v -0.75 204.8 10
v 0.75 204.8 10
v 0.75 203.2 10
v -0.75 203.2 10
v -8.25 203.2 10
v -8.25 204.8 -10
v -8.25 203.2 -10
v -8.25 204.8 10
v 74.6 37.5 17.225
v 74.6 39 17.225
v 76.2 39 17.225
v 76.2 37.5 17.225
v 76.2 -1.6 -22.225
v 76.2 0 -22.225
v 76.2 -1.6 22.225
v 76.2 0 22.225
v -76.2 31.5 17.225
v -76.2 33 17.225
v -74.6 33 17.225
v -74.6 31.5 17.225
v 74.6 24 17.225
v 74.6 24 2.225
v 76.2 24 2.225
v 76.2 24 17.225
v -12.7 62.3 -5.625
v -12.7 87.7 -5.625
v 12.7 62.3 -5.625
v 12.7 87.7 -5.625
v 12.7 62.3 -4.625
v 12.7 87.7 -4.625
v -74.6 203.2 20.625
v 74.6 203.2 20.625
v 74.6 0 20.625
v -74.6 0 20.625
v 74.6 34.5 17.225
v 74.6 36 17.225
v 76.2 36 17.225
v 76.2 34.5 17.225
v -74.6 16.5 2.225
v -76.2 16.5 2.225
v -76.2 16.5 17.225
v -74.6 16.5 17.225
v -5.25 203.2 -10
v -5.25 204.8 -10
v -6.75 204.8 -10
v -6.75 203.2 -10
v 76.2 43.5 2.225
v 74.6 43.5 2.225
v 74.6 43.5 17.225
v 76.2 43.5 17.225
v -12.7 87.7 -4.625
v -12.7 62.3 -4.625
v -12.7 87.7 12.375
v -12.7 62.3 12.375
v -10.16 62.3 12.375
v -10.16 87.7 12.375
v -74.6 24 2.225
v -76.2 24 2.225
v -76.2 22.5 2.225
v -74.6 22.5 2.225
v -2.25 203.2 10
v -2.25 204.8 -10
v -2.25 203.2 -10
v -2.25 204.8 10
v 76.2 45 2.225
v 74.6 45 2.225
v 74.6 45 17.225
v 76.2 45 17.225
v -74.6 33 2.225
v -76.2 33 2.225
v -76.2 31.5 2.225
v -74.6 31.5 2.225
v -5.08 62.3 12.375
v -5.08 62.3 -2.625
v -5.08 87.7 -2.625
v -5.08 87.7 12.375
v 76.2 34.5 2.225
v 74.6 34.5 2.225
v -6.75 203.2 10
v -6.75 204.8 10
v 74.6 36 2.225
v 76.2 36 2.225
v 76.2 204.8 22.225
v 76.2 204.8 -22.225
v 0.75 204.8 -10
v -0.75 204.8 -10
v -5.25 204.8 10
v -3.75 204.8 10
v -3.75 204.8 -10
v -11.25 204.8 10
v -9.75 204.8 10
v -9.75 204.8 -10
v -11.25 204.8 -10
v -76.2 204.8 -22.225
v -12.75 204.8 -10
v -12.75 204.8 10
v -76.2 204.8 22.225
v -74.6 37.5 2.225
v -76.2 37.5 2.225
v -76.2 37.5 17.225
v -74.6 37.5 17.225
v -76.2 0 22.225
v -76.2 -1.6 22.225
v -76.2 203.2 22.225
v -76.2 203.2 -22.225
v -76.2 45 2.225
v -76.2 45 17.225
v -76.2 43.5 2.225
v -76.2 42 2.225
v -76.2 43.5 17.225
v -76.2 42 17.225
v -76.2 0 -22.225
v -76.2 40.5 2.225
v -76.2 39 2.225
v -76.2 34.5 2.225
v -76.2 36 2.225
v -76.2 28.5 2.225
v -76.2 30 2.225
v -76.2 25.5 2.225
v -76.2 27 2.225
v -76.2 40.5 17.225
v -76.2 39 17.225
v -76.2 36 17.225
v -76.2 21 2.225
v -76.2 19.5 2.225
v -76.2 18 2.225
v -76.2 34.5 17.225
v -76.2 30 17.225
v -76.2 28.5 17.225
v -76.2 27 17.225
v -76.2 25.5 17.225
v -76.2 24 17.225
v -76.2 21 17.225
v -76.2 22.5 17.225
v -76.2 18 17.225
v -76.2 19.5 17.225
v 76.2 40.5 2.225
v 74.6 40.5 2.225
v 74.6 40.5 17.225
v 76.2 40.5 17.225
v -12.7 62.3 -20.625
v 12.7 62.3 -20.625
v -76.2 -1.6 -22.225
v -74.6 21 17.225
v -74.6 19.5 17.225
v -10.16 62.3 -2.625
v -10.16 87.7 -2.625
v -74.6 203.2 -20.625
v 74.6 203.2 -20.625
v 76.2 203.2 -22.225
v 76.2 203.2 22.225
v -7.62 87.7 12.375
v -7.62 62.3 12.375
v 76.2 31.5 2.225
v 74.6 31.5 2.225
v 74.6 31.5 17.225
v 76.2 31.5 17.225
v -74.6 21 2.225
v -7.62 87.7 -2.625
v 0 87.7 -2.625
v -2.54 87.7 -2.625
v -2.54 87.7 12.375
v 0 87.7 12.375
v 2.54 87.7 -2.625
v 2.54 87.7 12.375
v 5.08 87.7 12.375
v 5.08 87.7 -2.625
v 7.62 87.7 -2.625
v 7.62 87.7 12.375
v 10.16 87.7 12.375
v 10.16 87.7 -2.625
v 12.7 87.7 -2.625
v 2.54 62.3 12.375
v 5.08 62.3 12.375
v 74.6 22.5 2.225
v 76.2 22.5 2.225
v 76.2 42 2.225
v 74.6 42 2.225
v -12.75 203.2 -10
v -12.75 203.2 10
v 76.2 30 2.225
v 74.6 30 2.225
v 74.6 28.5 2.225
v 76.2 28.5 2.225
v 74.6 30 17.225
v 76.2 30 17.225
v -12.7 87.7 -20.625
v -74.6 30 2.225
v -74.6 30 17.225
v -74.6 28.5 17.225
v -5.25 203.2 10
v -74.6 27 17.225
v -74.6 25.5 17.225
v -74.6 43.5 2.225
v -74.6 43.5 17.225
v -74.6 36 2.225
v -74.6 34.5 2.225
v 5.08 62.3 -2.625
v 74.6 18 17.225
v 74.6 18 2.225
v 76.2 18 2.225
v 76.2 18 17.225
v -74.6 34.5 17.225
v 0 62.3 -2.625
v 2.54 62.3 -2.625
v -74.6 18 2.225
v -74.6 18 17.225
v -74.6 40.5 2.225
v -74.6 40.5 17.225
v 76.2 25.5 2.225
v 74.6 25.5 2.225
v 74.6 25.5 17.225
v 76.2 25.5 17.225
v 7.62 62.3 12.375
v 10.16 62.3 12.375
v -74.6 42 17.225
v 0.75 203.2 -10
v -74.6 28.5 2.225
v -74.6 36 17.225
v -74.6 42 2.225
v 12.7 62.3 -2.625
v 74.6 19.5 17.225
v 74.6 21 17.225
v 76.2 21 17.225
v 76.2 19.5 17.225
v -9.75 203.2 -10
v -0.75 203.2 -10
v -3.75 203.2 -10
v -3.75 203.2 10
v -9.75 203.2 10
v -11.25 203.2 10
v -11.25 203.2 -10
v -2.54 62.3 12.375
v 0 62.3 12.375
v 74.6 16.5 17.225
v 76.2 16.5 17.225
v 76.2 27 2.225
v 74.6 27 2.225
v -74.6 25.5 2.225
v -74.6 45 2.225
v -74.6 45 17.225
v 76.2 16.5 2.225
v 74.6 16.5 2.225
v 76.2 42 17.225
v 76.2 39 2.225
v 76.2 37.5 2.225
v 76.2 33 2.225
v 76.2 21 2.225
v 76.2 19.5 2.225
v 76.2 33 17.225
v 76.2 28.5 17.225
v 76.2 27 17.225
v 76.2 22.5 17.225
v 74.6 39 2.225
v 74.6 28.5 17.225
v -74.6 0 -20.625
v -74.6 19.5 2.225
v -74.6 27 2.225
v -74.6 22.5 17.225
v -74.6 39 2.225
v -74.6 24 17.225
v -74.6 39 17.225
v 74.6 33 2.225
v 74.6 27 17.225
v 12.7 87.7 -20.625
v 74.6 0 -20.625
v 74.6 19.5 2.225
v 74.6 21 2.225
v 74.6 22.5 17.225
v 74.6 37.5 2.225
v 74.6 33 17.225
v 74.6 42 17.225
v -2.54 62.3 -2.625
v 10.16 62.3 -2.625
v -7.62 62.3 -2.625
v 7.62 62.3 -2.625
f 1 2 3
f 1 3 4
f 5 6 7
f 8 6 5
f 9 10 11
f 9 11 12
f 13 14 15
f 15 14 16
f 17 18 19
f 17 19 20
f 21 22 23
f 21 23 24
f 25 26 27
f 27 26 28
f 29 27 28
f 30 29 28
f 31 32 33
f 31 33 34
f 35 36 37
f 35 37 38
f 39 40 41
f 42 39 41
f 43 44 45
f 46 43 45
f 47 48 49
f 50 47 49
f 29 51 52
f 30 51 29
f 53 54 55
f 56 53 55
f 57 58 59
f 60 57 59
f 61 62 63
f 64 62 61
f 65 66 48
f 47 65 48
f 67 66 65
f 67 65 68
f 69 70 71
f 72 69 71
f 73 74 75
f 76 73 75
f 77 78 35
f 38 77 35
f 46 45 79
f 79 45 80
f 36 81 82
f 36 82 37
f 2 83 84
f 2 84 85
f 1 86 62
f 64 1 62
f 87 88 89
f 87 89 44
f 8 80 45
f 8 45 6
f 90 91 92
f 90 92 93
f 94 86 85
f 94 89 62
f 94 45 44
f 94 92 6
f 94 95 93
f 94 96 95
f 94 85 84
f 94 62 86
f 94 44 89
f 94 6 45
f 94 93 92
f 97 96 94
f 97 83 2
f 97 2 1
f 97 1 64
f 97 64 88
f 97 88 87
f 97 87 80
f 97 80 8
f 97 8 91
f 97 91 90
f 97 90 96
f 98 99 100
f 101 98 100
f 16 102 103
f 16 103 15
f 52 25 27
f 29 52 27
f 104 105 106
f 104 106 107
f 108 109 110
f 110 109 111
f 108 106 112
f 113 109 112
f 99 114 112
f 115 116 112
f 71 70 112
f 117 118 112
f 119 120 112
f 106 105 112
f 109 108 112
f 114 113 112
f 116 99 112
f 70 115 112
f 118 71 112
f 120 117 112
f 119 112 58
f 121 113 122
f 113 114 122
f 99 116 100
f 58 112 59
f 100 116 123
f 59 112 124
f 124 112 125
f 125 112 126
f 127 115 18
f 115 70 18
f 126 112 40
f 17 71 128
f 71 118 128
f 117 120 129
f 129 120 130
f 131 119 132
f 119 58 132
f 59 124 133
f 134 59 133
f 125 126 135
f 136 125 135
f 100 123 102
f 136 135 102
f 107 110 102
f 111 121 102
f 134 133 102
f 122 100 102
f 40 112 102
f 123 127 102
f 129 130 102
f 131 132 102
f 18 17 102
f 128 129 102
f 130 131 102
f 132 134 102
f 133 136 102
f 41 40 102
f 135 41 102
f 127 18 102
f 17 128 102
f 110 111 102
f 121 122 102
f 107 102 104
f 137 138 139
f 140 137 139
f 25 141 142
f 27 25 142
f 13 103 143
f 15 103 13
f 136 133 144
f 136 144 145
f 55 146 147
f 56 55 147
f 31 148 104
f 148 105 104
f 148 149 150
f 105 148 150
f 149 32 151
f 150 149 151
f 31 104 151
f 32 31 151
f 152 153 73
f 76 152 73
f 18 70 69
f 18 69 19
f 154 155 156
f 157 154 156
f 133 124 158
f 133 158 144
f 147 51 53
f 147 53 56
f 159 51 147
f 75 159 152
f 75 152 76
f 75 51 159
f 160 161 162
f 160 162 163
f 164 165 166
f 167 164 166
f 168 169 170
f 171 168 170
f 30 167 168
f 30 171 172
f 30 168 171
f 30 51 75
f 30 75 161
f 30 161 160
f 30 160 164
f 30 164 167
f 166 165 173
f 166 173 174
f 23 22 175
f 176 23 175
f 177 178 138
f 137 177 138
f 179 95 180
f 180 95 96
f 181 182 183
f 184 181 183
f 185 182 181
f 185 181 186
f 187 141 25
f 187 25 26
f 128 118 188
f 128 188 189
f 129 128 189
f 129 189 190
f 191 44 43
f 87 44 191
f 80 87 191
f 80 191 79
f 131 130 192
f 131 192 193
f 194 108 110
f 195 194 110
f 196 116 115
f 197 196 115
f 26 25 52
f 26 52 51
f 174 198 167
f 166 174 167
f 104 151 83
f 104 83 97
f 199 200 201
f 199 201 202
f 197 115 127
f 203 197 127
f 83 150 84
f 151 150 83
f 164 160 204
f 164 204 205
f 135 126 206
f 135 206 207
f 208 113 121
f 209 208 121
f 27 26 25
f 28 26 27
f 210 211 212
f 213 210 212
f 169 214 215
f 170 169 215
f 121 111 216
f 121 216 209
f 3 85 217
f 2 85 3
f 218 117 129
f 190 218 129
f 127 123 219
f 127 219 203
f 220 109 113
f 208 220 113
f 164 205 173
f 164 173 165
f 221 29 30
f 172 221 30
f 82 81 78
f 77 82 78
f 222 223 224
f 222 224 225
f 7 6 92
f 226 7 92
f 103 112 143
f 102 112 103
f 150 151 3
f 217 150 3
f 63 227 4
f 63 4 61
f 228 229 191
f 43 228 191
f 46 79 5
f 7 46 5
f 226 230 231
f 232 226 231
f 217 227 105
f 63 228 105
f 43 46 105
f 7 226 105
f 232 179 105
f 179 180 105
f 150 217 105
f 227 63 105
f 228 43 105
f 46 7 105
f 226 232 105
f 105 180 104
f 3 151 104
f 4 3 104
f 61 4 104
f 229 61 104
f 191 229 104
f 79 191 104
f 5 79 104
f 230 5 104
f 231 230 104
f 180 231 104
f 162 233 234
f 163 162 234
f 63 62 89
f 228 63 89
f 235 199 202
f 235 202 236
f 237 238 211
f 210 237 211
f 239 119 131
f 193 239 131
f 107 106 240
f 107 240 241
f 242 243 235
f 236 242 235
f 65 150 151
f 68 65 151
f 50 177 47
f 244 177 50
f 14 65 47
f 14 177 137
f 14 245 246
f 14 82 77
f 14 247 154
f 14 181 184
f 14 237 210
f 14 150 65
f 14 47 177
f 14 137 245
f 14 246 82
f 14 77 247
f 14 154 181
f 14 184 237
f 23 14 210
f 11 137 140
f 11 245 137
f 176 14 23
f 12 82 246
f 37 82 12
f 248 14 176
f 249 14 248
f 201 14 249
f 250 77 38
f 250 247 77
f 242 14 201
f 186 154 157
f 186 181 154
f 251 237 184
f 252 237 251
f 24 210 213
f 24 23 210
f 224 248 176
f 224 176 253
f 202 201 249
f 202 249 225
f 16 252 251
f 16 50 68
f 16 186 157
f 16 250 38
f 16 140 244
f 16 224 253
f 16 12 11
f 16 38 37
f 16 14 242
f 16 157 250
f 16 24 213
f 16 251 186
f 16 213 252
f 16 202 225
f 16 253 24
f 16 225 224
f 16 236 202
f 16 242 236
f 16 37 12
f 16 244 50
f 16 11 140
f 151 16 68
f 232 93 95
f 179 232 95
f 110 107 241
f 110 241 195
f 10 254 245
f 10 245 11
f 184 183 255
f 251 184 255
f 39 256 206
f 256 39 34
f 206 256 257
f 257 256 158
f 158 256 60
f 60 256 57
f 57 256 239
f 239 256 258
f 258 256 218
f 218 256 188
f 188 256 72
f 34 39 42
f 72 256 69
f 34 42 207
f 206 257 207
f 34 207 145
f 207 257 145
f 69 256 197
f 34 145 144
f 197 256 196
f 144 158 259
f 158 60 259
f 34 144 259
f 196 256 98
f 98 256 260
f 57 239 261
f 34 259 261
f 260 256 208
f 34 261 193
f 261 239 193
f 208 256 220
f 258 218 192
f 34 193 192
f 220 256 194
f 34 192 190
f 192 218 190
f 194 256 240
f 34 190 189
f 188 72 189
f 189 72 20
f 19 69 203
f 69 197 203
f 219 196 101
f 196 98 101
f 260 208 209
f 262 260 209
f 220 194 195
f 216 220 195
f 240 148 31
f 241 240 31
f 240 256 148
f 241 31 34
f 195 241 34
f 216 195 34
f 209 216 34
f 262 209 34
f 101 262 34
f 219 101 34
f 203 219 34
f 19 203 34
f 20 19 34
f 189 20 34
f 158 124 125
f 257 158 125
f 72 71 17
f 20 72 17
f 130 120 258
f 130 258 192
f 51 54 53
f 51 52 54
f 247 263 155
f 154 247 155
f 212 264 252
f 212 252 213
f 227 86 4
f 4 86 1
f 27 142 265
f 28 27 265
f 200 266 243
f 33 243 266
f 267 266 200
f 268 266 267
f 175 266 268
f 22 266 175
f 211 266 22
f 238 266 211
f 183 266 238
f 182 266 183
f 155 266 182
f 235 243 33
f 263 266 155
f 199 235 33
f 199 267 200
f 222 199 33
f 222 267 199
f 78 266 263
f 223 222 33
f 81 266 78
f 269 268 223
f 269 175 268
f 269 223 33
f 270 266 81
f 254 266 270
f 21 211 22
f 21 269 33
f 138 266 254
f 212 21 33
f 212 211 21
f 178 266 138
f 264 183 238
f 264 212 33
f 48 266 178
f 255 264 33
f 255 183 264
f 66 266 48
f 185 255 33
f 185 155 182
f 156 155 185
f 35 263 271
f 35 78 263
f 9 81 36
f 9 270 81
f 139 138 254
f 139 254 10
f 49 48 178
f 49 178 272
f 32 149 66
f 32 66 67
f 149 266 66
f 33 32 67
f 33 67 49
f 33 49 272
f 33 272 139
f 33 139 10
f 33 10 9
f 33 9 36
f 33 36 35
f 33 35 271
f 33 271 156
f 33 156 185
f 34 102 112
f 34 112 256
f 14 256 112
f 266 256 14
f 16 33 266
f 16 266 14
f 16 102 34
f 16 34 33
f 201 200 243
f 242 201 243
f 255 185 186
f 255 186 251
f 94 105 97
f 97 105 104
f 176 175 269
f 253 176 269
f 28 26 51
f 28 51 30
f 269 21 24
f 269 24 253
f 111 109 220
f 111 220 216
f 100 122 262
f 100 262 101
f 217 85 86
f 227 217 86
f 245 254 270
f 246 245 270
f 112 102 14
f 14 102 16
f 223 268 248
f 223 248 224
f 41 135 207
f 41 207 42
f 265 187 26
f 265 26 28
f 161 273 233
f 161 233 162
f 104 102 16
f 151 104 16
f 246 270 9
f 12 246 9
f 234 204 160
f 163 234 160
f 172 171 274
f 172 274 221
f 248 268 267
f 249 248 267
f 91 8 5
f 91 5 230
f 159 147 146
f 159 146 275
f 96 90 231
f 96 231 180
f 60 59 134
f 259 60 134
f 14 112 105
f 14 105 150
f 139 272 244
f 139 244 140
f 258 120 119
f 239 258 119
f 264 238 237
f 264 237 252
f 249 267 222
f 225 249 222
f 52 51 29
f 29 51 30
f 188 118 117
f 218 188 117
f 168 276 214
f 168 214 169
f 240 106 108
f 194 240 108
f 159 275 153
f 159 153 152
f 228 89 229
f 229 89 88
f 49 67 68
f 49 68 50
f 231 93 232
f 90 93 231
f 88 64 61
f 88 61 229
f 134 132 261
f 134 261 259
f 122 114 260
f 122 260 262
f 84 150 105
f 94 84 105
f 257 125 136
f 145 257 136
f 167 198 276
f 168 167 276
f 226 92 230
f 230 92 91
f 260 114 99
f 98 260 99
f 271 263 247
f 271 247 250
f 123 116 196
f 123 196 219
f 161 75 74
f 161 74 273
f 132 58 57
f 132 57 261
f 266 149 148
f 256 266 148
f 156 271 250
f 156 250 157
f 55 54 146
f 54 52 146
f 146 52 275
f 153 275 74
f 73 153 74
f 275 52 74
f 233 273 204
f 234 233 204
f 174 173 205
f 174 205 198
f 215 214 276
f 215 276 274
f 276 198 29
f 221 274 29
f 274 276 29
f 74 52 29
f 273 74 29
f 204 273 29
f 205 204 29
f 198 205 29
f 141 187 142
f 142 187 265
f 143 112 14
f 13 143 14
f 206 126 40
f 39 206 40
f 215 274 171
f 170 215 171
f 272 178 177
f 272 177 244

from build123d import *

# Parameters (mm, degrees)
F0_W      = 152.4
F0_H      = 44.45
F1_DEPTH  = 203.2
F2_W      = 149.1996
F2_H      = 41.2496
F3_DEPTH  = 203.201
F7_W      = 152.4
F7_H      = 44.45
F8_DEPTH  = 1.6002
F9_W      = 152.4
F9_H      = 44.45
F10_DEPTH = 1.6002
F11_W     = 1.5
F11_H     = 15
F12_DEPTH = 152.401
F13_W     = 25.4
F13_H     = 25.4
F14_DEPTH = 15
F15_W     = 25.4
F15_H     = 25.4
F16_DEPTH = 1
F17_W     = 25.4
F17_H     = 25.4
F18_DEPTH = 2
F19_W     = 2.54
F19_H     = 25.4
F20_DEPTH = 15
F21_W     = 1.5
F21_H     = 20
F22_DEPTH = 25


# Not quite as in the source:
# - a feature of the source that left no trace in its solid (it failed there, or was rolled back) is left out


with BuildPart() as f1:
    # F0 (on Front) → F1 (new body)
    with BuildSketch(Plane.XZ):
        Rectangle(F0_W, F0_H)
    extrude(amount=-F1_DEPTH)

    # F2 (on face) → F3 (cut, through all)
    with BuildSketch(Plane(origin=(0, 203.2, 0), x_dir=(-1, 0, 0), z_dir=(0, 1, 0))):
        Rectangle(F2_W, F2_H)
    extrude(amount=-F3_DEPTH, mode=Mode.SUBTRACT)

    # F11 (on face) → F12 (cut, through all)
    with BuildSketch(Plane(origin=(-76.2, 0, 0), x_dir=(0, -1, 0), z_dir=(-1, 0, 0))):
        with Locations((-44.25, 9.725)):
            Rectangle(F11_W, F11_H)
        with Locations((-41.25, 9.725)):
            Rectangle(F11_W, F11_H)
        with Locations((-38.25, 9.725)):
            Rectangle(F11_W, F11_H)
        with Locations((-35.25, 9.725)):
            Rectangle(F11_W, F11_H)
        with Locations((-32.25, 9.725)):
            Rectangle(F11_W, F11_H)
        with Locations((-29.25, 9.725)):
            Rectangle(F11_W, F11_H)
        with Locations((-26.25, 9.725)):
            Rectangle(F11_W, F11_H)
        with Locations((-23.25, 9.725)):
            Rectangle(F11_W, F11_H)
        with Locations((-20.25, 9.725)):
            Rectangle(F11_W, F11_H)
        with Locations((-17.25, 9.725)):
            Rectangle(F11_W, F11_H)
    extrude(amount=-F12_DEPTH, mode=Mode.SUBTRACT)


with BuildPart() as f8:
    # F7 (on face) → F8 (new body)
    with BuildSketch(Plane(origin=(0, 203.2, 0), x_dir=(-1, 0, 0), z_dir=(0, 1, 0))):
        Rectangle(F7_W, F7_H)
    extrude(amount=F8_DEPTH)

    # F21 (on face) → F22 (cut)
    with BuildSketch(Plane(origin=(0, 204.8002, 0), x_dir=(-1, 0, 0), z_dir=(0, 1, 0))):
        Rectangle(F21_W, F21_H)
        with Locations((3, 0)):
            Rectangle(F21_W, F21_H)
        with Locations((6, 0)):
            Rectangle(F21_W, F21_H)
        with Locations((9, 0)):
            Rectangle(F21_W, F21_H)
        with Locations((12, 0)):
            Rectangle(F21_W, F21_H)
    extrude(amount=-F22_DEPTH, mode=Mode.SUBTRACT)


with BuildPart() as f10:
    # F9 (on face) → F10 (new body)
    with BuildSketch(Plane.XZ):
        Rectangle(F9_W, F9_H)
    extrude(amount=F10_DEPTH)


with BuildPart() as f14:
    # F13 (on face) → F14 (new body)
    with BuildSketch(Plane.XY.offset(-20.6248)):
        with Locations((0, 75)):
            Rectangle(F13_W, F13_H)
    extrude(amount=F14_DEPTH)


with BuildPart() as f16:
    # F15 (on face) → F16 (new body)
    with BuildSketch(Plane.XY.offset(-5.6248)):
        with Locations((0, 75)):
            Rectangle(F15_W, F15_H)
    extrude(amount=F16_DEPTH)


with BuildPart() as f18:
    # F17 (on face) → F18 (new body)
    with BuildSketch(Plane.XY.offset(-4.6248)):
        with Locations((0, 75)):
            Rectangle(F17_W, F17_H)
    extrude(amount=F18_DEPTH)

    # F19 (on face) → F20 (join)
    with BuildSketch(Plane.XY.offset(-2.6248)):
        with Locations((-11.43, 75)):
            Rectangle(F19_W, F19_H)
        with Locations((-6.35, 75)):
            Rectangle(F19_W, F19_H)
        with Locations((-1.27, 75)):
            Rectangle(F19_W, F19_H)
        with Locations((3.81, 75)):
            Rectangle(F19_W, F19_H)
        with Locations((8.89, 75)):
            Rectangle(F19_W, F19_H)
    extrude(amount=F20_DEPTH)


solid = Compound([f1.part, f8.part, f10.part, f14.part, f16.part, f18.part])
